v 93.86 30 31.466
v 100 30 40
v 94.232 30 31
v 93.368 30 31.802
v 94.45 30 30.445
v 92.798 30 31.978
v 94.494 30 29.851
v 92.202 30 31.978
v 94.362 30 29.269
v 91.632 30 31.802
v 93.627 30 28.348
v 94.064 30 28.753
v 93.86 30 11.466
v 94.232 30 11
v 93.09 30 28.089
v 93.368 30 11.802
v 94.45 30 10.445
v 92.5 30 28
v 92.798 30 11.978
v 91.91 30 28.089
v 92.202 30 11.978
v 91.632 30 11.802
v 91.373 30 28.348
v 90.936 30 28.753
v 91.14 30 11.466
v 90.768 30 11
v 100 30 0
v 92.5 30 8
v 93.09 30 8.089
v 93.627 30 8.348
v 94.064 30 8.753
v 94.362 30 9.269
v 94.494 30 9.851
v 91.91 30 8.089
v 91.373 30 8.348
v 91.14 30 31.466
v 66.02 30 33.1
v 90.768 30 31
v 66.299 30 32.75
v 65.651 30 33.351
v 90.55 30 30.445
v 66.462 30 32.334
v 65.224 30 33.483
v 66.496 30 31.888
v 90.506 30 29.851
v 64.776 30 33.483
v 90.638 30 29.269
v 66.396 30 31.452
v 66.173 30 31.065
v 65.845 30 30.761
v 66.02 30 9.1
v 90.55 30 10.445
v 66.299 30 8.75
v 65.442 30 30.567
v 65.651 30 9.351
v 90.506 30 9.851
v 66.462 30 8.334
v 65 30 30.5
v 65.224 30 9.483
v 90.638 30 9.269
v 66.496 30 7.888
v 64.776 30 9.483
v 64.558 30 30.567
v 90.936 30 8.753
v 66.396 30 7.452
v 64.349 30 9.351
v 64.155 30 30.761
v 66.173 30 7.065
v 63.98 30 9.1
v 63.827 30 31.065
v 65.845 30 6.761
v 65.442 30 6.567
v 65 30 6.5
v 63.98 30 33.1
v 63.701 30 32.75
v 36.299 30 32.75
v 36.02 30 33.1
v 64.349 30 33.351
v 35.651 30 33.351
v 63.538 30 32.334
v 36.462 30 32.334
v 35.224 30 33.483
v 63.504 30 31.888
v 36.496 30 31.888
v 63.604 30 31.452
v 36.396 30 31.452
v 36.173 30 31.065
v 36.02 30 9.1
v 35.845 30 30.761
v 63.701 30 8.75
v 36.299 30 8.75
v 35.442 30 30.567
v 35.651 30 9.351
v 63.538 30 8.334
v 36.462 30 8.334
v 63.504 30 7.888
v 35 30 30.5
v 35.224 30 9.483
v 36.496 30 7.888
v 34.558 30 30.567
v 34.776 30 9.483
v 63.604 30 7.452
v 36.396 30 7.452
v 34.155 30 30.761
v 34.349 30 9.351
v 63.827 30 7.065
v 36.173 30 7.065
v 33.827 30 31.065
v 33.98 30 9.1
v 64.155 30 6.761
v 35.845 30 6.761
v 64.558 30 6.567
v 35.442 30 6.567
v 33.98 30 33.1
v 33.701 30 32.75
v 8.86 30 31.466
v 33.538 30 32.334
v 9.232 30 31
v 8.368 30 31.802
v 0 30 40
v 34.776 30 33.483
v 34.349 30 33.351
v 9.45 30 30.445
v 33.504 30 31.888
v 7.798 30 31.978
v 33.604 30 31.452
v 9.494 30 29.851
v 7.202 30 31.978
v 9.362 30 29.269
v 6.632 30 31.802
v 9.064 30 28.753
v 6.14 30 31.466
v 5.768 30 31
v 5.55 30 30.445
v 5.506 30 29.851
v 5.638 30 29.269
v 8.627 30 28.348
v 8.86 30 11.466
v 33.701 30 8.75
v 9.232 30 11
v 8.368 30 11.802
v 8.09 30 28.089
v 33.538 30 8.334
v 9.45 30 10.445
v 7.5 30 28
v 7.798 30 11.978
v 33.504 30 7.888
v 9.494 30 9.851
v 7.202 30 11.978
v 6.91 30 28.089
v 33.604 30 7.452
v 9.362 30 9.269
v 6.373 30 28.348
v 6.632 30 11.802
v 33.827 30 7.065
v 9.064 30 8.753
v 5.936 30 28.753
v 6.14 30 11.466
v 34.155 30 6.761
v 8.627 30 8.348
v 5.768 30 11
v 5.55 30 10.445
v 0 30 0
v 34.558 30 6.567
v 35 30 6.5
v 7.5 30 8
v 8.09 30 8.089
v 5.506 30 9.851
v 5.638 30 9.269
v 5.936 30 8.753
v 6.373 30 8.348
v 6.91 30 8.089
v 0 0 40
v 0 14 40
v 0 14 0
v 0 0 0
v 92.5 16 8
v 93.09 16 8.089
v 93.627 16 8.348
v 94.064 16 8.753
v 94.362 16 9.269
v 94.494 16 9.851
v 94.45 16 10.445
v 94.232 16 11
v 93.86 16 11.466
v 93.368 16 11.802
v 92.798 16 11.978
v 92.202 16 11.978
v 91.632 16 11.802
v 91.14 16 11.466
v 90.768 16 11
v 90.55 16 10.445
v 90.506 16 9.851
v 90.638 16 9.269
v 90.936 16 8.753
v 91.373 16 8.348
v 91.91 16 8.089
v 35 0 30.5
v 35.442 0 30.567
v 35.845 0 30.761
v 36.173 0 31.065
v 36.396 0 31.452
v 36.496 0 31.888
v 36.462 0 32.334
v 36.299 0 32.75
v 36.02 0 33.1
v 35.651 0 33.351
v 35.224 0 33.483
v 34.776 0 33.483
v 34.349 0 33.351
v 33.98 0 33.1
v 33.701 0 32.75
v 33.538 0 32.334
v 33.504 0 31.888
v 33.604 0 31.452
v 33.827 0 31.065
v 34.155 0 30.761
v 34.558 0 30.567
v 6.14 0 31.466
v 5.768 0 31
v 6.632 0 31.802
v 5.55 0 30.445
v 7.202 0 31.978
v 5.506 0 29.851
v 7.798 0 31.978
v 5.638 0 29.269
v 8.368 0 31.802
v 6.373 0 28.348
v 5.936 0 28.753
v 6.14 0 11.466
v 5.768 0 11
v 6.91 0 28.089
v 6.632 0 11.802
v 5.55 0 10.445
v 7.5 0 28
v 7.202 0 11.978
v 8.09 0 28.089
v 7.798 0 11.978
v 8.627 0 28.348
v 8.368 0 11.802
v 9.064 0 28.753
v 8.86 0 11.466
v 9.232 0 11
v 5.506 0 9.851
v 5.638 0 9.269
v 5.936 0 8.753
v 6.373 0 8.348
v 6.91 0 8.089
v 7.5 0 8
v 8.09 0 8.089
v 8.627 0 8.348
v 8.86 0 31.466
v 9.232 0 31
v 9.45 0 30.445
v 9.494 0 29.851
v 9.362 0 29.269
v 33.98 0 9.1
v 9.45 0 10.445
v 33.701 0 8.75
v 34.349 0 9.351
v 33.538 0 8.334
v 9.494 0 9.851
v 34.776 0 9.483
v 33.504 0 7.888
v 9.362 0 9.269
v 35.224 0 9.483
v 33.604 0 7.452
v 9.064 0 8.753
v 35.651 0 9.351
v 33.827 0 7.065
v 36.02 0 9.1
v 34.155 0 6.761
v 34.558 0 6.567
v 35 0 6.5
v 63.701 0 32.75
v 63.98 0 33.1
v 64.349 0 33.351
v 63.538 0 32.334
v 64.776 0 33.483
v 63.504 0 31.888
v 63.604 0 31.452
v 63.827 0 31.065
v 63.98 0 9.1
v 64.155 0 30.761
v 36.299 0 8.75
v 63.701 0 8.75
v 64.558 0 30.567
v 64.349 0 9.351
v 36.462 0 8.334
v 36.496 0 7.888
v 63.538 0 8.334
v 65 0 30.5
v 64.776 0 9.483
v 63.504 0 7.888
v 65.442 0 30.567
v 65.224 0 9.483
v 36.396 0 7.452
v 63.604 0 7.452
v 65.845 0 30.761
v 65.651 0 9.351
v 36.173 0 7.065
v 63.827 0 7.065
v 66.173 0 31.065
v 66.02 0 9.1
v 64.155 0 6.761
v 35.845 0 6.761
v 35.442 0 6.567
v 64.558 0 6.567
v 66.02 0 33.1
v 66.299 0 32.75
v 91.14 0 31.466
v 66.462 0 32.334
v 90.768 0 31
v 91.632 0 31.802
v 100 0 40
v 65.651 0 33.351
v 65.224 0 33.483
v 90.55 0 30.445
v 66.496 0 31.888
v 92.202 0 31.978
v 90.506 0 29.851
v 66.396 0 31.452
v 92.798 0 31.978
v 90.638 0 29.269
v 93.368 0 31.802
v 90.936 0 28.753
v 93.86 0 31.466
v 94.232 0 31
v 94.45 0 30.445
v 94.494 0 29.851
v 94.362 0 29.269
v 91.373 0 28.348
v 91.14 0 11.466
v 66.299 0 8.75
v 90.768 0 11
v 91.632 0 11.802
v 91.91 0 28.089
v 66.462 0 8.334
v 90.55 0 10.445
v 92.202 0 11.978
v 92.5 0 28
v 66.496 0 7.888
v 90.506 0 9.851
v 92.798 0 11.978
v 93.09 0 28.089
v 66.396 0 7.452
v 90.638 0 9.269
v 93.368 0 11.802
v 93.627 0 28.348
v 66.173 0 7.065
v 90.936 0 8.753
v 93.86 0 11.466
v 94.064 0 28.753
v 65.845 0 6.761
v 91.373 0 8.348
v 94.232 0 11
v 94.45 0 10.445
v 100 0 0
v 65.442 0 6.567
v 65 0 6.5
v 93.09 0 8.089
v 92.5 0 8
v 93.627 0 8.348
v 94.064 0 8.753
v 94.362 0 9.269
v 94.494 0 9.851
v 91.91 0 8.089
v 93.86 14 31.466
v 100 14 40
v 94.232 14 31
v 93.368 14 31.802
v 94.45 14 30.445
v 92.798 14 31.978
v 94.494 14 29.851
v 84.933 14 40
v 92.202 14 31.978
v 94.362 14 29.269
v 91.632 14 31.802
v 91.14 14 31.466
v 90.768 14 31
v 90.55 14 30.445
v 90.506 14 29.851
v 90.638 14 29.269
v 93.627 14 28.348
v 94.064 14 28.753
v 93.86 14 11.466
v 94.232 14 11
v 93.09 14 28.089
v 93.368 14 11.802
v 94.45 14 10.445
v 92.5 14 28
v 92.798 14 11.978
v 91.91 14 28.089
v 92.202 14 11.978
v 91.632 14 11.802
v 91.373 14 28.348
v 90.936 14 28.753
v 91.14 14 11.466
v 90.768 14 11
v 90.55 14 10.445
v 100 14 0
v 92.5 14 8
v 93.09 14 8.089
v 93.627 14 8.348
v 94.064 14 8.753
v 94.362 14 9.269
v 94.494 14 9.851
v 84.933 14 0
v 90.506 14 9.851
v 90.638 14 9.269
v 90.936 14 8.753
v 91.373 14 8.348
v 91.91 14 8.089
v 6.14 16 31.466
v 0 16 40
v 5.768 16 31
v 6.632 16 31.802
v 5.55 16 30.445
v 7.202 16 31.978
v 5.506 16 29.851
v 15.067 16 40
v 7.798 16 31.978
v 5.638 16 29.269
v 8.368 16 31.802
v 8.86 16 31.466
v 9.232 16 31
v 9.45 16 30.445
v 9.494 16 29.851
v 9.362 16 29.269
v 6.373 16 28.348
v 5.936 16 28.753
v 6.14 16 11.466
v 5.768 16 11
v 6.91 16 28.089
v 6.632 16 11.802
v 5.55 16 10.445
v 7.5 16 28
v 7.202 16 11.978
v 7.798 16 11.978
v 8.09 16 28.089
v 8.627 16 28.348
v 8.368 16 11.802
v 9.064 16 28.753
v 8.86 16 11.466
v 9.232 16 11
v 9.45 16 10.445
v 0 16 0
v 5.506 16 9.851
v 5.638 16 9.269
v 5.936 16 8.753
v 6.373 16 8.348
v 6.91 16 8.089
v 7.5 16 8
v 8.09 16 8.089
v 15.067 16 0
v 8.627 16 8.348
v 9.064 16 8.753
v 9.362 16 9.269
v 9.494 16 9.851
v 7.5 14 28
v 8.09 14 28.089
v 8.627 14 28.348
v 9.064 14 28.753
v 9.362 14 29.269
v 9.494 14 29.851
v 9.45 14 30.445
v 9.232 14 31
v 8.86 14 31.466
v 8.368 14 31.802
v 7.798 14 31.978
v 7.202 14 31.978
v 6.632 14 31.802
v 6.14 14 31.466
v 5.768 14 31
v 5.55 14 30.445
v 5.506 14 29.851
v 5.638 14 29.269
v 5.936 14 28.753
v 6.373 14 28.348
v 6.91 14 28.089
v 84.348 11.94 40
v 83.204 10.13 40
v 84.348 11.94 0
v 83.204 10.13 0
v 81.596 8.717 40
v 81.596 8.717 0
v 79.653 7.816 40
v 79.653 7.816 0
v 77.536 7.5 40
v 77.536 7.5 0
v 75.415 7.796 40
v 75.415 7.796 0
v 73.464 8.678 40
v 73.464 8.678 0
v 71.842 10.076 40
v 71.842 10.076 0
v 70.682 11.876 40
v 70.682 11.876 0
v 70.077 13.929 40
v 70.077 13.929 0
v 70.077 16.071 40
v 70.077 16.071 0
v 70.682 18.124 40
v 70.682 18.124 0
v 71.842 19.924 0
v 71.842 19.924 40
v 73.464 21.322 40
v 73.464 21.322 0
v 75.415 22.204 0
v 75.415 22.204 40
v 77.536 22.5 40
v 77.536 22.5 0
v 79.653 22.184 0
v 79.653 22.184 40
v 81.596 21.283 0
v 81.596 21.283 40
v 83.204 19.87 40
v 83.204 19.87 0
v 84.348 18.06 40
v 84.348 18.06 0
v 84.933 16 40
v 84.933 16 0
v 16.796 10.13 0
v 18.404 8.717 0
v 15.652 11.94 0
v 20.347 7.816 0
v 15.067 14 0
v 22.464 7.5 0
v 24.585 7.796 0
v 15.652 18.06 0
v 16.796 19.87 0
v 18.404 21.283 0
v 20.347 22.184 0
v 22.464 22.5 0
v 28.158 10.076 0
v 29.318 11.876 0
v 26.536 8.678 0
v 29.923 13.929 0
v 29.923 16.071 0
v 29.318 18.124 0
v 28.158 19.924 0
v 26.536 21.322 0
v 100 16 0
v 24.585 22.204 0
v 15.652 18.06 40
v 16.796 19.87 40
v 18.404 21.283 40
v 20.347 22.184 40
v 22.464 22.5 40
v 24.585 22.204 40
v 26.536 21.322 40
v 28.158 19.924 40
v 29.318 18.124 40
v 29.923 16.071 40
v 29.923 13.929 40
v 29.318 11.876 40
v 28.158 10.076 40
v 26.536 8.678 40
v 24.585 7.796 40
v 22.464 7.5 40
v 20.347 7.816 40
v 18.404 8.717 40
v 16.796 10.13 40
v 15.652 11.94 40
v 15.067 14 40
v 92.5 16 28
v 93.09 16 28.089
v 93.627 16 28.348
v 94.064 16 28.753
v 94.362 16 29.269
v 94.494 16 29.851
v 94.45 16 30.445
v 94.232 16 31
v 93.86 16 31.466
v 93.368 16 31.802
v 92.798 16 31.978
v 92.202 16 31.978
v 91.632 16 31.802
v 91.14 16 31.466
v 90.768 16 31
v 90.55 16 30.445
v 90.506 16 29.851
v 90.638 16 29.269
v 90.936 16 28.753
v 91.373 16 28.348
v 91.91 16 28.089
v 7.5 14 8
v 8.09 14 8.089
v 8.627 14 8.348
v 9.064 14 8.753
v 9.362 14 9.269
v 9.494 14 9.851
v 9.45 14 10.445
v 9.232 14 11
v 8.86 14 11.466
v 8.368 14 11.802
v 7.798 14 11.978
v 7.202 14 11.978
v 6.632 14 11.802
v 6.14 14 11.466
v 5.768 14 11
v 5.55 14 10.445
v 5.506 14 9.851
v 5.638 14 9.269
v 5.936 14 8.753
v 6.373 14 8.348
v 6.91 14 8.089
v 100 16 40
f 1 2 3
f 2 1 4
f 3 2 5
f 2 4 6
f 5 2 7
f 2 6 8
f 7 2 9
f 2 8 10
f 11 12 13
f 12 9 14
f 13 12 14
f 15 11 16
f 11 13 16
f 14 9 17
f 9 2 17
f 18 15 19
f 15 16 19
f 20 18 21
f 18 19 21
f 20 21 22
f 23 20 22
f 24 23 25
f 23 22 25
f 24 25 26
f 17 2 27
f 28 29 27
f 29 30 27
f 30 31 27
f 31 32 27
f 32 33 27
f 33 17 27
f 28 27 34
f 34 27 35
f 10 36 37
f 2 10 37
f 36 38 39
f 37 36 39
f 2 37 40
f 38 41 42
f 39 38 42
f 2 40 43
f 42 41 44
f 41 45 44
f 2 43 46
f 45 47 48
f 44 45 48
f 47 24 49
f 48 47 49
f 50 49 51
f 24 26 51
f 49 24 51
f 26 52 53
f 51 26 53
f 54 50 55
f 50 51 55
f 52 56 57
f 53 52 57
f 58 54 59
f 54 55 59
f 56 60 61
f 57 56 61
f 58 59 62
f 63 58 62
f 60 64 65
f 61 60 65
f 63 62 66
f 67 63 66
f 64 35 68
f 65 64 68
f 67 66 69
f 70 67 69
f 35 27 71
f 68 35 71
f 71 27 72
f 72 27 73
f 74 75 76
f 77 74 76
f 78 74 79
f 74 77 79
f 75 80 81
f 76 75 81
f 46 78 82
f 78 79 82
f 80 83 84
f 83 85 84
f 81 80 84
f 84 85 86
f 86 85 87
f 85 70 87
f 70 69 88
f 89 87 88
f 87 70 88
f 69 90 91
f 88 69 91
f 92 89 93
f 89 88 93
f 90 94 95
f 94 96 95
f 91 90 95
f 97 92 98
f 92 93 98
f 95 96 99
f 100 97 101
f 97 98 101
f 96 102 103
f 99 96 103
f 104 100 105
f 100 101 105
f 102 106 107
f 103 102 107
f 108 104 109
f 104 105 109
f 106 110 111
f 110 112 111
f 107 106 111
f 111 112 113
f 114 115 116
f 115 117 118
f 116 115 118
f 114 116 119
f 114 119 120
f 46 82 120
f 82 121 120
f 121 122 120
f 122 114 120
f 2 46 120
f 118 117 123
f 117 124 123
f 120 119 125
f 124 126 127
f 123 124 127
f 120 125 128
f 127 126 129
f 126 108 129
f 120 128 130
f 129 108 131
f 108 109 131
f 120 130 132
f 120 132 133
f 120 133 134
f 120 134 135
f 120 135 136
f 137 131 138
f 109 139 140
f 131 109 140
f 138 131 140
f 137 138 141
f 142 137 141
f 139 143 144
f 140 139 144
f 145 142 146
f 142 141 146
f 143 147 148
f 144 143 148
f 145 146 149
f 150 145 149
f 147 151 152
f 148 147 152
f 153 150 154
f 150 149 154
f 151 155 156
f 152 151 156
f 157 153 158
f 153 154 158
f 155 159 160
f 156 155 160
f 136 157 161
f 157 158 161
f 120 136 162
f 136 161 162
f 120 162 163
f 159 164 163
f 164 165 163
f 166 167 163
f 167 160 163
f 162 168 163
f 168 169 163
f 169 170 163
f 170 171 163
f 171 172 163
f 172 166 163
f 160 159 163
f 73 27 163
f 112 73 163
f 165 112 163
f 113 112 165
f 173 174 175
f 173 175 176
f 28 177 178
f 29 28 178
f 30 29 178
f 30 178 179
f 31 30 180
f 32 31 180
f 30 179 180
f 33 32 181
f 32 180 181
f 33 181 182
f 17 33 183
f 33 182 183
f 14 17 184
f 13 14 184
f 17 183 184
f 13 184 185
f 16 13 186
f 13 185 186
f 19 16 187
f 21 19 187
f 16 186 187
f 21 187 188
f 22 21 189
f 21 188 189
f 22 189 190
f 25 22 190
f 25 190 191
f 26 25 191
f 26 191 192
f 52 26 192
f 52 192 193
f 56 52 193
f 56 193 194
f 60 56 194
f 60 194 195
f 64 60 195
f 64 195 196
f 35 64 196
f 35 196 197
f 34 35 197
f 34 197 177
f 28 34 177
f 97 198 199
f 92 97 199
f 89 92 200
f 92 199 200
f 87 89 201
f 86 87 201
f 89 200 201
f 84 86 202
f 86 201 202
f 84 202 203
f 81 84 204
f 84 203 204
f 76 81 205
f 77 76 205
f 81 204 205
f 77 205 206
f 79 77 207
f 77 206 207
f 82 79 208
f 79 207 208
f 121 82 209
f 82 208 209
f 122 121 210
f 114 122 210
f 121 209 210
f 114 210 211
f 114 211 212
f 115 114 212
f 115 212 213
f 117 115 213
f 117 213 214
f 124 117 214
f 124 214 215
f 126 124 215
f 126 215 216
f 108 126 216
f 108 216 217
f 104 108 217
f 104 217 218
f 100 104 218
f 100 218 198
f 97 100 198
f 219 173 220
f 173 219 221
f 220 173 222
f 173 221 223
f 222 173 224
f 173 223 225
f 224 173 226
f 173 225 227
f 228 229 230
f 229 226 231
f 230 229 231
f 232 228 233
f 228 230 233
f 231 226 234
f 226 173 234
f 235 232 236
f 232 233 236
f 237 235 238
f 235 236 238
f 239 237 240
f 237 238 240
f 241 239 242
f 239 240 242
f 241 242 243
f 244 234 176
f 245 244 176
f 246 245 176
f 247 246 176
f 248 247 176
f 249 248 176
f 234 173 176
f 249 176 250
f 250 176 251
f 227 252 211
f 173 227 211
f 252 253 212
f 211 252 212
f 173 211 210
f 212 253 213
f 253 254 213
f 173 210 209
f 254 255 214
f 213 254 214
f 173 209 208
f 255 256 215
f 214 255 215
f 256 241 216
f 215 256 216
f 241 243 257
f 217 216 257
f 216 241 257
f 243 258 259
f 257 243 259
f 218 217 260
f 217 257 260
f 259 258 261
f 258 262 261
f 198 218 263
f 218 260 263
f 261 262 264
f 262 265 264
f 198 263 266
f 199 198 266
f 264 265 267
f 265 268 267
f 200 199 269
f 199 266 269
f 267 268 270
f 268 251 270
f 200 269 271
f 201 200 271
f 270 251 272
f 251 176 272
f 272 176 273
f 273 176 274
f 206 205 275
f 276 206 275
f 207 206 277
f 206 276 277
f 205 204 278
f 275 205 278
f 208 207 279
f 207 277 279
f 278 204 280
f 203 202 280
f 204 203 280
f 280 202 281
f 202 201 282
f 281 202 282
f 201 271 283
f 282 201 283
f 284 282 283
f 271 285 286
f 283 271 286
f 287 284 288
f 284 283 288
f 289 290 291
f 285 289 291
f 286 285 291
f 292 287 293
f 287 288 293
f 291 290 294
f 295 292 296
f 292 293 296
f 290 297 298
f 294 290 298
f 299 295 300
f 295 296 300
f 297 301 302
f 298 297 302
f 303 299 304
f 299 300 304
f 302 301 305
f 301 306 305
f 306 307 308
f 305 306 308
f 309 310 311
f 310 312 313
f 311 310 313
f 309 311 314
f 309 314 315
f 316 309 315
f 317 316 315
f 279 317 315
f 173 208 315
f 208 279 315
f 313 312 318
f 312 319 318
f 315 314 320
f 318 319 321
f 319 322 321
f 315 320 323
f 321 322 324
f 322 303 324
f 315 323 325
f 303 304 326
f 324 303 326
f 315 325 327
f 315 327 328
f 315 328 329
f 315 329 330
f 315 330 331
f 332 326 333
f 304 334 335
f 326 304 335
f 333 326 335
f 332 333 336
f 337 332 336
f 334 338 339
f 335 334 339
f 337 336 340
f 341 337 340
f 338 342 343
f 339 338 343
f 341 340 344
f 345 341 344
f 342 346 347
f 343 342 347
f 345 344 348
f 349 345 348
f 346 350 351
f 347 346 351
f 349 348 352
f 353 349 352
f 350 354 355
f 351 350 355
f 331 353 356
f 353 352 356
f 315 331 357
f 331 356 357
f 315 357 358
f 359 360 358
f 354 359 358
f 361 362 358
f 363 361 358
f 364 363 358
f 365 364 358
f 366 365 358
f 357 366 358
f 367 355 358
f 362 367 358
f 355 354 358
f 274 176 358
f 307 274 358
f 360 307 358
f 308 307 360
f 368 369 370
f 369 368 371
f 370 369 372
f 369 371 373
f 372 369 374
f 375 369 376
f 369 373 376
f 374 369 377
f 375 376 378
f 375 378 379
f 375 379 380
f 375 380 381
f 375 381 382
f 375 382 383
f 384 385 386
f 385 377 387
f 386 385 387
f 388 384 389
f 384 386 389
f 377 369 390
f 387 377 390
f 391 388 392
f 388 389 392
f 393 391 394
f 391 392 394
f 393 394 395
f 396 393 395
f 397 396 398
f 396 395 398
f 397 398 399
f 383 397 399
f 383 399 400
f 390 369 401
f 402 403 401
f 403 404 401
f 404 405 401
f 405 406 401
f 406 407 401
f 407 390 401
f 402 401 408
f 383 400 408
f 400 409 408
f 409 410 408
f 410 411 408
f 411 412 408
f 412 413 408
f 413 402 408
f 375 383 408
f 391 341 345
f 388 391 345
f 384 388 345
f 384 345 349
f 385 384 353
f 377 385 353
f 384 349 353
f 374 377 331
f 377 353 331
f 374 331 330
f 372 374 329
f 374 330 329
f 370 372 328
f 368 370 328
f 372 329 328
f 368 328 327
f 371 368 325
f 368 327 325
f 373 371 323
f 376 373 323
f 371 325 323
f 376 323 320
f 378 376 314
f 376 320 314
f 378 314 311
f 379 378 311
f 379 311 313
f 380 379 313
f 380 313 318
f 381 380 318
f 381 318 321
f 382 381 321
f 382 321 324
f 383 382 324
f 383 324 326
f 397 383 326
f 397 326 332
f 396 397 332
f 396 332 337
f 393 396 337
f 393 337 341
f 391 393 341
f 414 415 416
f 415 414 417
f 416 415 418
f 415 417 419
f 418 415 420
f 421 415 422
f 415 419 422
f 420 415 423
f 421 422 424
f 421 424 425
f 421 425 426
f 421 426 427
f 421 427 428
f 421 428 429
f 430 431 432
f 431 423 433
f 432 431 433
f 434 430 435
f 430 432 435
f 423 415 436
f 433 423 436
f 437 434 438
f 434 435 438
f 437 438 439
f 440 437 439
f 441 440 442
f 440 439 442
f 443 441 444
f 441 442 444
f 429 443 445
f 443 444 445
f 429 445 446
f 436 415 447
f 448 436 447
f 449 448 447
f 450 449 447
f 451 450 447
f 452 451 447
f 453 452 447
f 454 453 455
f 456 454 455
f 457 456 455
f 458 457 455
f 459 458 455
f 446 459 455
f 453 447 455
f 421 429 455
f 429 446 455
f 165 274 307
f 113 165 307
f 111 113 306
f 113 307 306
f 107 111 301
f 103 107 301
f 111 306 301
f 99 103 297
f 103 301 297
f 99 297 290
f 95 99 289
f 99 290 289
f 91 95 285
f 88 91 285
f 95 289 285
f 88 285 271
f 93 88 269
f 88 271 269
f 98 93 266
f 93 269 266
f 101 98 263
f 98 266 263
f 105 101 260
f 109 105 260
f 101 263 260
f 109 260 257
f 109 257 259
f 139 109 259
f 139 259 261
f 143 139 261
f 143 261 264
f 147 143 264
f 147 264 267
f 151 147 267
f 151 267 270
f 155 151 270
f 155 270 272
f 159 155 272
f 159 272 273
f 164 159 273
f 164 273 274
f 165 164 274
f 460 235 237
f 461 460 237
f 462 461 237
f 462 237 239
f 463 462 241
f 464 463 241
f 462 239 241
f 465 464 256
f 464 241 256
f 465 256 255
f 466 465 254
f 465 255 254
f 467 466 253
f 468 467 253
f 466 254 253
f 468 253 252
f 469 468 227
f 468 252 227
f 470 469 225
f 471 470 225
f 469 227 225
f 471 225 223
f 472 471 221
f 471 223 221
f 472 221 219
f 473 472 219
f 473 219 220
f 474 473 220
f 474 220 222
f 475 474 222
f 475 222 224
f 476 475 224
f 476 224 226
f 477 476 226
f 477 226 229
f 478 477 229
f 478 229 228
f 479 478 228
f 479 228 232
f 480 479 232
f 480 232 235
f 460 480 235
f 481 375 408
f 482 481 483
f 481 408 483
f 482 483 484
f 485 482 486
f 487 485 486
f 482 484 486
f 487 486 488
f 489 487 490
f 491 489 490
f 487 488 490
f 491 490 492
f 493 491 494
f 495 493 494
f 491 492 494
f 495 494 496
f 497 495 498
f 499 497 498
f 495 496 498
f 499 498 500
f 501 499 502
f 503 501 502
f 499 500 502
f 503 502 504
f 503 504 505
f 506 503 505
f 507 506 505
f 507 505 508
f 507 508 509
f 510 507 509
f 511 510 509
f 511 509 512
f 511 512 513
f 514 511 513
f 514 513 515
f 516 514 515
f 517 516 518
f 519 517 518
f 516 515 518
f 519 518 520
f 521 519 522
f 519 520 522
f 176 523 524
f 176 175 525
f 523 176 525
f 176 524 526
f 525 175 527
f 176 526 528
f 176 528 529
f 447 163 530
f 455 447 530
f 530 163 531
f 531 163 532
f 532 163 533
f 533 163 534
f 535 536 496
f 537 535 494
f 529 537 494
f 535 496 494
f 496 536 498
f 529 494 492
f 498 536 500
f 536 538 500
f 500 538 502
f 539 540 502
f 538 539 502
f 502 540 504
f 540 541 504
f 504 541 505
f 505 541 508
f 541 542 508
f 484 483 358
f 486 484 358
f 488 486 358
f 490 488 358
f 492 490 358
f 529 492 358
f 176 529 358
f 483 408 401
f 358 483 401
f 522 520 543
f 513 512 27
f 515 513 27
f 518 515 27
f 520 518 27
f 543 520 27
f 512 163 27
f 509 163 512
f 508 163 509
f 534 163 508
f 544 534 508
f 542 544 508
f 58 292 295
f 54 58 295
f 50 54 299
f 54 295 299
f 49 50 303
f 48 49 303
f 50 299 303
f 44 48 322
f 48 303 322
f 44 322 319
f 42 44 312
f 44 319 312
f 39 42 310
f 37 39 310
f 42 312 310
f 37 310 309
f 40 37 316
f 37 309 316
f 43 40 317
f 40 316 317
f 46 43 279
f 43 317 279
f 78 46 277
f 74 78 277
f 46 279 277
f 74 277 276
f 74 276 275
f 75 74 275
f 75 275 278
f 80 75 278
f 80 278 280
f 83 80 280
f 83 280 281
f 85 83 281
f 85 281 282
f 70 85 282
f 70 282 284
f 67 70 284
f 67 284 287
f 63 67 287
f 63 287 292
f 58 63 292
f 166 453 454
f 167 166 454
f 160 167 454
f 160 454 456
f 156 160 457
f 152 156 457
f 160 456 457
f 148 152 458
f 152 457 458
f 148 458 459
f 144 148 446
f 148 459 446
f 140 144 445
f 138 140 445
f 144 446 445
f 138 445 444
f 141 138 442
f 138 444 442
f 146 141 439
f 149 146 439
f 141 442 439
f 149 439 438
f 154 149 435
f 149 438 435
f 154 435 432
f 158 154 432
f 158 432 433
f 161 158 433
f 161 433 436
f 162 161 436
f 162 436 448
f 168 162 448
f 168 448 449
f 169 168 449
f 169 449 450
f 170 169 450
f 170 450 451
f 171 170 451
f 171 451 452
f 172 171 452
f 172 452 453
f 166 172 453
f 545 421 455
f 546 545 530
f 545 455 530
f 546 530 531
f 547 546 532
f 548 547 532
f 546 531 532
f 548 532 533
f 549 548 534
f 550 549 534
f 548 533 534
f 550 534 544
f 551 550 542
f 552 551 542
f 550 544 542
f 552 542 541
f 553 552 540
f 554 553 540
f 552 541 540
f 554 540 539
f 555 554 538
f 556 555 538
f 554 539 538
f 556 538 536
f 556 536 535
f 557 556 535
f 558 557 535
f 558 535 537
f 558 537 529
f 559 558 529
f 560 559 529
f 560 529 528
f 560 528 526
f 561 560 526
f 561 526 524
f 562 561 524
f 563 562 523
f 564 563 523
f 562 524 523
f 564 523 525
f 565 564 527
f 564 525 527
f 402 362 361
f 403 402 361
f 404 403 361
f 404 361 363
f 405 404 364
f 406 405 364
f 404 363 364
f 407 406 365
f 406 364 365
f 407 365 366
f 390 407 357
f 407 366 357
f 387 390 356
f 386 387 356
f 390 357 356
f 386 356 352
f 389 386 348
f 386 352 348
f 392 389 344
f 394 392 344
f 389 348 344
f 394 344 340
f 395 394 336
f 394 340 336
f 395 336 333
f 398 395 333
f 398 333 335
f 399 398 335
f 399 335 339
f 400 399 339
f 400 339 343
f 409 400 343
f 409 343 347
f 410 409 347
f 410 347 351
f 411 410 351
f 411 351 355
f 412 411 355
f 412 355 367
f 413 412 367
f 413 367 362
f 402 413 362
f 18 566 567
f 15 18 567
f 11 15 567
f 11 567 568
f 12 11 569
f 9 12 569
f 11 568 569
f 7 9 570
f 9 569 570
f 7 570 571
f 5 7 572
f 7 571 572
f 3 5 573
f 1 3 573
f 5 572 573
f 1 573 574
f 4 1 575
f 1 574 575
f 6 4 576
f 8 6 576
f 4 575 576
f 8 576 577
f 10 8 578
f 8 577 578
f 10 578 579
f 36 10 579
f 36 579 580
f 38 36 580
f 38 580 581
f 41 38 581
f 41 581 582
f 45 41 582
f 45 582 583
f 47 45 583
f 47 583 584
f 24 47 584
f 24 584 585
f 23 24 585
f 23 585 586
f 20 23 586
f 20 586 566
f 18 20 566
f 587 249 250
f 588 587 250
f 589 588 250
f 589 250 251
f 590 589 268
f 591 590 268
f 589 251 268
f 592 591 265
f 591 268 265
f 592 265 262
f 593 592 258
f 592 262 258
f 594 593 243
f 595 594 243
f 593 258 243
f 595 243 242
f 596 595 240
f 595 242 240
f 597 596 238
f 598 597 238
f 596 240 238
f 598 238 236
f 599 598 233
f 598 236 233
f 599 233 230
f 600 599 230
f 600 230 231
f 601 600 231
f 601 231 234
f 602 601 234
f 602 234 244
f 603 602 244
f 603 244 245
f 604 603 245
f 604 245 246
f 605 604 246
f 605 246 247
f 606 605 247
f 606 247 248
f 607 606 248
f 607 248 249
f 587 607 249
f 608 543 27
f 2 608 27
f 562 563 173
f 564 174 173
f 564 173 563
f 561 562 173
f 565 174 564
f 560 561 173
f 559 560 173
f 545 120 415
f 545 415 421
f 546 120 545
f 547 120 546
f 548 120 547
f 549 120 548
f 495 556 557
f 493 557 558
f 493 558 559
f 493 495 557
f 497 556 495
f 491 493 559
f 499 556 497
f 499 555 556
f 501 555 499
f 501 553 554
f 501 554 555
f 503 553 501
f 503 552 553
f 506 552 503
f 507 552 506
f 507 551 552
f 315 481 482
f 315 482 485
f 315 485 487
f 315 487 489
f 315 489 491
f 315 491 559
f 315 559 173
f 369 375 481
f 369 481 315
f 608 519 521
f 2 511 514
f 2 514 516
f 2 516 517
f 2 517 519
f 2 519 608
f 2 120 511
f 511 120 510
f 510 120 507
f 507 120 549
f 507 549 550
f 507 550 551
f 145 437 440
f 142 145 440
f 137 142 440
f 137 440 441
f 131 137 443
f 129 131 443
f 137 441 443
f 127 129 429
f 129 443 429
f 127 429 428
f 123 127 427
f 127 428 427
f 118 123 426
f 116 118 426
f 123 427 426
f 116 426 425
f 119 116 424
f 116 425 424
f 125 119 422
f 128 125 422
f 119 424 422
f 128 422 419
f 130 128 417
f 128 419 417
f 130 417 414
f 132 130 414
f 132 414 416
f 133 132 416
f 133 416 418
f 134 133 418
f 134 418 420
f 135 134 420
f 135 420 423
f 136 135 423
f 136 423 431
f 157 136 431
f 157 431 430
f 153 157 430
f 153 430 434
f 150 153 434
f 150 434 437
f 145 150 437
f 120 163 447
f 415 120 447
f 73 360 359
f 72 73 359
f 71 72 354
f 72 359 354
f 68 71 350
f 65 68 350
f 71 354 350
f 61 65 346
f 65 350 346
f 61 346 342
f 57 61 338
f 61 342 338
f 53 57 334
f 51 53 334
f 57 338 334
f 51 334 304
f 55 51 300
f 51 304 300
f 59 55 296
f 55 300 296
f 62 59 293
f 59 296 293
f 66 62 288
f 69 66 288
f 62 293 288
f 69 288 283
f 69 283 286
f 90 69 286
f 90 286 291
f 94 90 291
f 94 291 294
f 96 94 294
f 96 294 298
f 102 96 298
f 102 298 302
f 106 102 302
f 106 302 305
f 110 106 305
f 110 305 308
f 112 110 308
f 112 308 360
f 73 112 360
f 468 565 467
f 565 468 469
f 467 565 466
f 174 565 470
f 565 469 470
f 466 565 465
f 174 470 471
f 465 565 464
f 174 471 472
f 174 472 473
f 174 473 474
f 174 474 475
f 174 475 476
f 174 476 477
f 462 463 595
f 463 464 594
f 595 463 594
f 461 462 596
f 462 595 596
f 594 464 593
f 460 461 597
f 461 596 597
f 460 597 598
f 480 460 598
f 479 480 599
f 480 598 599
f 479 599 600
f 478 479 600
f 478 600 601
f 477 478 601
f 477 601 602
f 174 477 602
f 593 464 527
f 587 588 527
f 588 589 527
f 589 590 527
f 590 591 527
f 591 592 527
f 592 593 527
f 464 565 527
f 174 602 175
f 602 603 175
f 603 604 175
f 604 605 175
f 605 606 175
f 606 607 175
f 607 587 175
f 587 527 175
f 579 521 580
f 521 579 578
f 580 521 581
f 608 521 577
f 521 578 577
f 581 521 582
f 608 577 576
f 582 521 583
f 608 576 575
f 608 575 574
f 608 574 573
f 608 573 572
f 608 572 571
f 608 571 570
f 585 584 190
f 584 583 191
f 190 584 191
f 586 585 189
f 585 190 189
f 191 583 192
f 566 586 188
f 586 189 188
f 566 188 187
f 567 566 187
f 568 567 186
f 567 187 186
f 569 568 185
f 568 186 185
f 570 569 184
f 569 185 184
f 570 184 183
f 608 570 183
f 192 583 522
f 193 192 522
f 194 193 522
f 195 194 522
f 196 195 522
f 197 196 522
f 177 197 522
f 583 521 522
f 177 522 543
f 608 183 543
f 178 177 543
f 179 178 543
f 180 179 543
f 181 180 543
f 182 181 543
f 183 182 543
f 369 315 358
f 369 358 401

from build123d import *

# Parameters (mm, degrees)
EXTRUDE_1_DEPTH     = 40
SKETCH_2_R          = 2
SKETCH_2_R_2        = 1.5
CUT_EXTRUDE_1_DEPTH = 112.803398875


with BuildPart() as part:
    # Эскиз1 → Бобышка-Вытянуть1 (new body)
    with BuildSketch(Plane.XY):
        with BuildLine():
            Line((0, 0), (100, 0))
            Line((100, 0), (100, 14))
            Line((100, 14), (84.933034374, 14))
            ThreePointArc((84.933034374, 14), (70, 15), (84.933034374, 16))
            Line((84.933034374, 16), (100, 16))
            Line((100, 16), (100, 30))
            Line((100, 30), (0, 30))
            Line((0, 30), (0, 16))
            Line((0, 16), (15.066965626, 16))
            ThreePointArc((15.066965626, 16), (30, 15), (15.066965626, 14))
            Line((15.066965626, 14), (0, 14))
            Line((0, 14), (0, 0))
        make_face()
    extrude(amount=EXTRUDE_1_DEPTH)

    # Эскиз2 → Вырез-Вытянуть1 (cut, through all)
    with BuildSketch(Plane.XZ):
        with Locations(Location((7.5, 30, 0), (0, 0, 270))):
            Circle(SKETCH_2_R)
        with Locations(Location((7.5, 10, 0), (0, 0, 270))):
            Circle(SKETCH_2_R)
        with Locations(Location((92.5, 30, 0), (0, 0, 270))):
            Circle(SKETCH_2_R)
        with Locations(Location((92.5, 10, 0), (0, 0, 270))):
            Circle(SKETCH_2_R)
        with Locations(Location((35, 32, 0), (0, 0, 270))):
            Circle(SKETCH_2_R_2)
        with Locations(Location((65, 32, 0), (0, 0, 270))):
            Circle(SKETCH_2_R_2)
        with Locations(Location((35, 8, 0), (0, 0, 270))):
            Circle(SKETCH_2_R_2)
        with Locations(Location((65, 8, 0), (0, 0, 270))):
            Circle(SKETCH_2_R_2)
    extrude(amount=-CUT_EXTRUDE_1_DEPTH, mode=Mode.SUBTRACT)


solid = part.part
